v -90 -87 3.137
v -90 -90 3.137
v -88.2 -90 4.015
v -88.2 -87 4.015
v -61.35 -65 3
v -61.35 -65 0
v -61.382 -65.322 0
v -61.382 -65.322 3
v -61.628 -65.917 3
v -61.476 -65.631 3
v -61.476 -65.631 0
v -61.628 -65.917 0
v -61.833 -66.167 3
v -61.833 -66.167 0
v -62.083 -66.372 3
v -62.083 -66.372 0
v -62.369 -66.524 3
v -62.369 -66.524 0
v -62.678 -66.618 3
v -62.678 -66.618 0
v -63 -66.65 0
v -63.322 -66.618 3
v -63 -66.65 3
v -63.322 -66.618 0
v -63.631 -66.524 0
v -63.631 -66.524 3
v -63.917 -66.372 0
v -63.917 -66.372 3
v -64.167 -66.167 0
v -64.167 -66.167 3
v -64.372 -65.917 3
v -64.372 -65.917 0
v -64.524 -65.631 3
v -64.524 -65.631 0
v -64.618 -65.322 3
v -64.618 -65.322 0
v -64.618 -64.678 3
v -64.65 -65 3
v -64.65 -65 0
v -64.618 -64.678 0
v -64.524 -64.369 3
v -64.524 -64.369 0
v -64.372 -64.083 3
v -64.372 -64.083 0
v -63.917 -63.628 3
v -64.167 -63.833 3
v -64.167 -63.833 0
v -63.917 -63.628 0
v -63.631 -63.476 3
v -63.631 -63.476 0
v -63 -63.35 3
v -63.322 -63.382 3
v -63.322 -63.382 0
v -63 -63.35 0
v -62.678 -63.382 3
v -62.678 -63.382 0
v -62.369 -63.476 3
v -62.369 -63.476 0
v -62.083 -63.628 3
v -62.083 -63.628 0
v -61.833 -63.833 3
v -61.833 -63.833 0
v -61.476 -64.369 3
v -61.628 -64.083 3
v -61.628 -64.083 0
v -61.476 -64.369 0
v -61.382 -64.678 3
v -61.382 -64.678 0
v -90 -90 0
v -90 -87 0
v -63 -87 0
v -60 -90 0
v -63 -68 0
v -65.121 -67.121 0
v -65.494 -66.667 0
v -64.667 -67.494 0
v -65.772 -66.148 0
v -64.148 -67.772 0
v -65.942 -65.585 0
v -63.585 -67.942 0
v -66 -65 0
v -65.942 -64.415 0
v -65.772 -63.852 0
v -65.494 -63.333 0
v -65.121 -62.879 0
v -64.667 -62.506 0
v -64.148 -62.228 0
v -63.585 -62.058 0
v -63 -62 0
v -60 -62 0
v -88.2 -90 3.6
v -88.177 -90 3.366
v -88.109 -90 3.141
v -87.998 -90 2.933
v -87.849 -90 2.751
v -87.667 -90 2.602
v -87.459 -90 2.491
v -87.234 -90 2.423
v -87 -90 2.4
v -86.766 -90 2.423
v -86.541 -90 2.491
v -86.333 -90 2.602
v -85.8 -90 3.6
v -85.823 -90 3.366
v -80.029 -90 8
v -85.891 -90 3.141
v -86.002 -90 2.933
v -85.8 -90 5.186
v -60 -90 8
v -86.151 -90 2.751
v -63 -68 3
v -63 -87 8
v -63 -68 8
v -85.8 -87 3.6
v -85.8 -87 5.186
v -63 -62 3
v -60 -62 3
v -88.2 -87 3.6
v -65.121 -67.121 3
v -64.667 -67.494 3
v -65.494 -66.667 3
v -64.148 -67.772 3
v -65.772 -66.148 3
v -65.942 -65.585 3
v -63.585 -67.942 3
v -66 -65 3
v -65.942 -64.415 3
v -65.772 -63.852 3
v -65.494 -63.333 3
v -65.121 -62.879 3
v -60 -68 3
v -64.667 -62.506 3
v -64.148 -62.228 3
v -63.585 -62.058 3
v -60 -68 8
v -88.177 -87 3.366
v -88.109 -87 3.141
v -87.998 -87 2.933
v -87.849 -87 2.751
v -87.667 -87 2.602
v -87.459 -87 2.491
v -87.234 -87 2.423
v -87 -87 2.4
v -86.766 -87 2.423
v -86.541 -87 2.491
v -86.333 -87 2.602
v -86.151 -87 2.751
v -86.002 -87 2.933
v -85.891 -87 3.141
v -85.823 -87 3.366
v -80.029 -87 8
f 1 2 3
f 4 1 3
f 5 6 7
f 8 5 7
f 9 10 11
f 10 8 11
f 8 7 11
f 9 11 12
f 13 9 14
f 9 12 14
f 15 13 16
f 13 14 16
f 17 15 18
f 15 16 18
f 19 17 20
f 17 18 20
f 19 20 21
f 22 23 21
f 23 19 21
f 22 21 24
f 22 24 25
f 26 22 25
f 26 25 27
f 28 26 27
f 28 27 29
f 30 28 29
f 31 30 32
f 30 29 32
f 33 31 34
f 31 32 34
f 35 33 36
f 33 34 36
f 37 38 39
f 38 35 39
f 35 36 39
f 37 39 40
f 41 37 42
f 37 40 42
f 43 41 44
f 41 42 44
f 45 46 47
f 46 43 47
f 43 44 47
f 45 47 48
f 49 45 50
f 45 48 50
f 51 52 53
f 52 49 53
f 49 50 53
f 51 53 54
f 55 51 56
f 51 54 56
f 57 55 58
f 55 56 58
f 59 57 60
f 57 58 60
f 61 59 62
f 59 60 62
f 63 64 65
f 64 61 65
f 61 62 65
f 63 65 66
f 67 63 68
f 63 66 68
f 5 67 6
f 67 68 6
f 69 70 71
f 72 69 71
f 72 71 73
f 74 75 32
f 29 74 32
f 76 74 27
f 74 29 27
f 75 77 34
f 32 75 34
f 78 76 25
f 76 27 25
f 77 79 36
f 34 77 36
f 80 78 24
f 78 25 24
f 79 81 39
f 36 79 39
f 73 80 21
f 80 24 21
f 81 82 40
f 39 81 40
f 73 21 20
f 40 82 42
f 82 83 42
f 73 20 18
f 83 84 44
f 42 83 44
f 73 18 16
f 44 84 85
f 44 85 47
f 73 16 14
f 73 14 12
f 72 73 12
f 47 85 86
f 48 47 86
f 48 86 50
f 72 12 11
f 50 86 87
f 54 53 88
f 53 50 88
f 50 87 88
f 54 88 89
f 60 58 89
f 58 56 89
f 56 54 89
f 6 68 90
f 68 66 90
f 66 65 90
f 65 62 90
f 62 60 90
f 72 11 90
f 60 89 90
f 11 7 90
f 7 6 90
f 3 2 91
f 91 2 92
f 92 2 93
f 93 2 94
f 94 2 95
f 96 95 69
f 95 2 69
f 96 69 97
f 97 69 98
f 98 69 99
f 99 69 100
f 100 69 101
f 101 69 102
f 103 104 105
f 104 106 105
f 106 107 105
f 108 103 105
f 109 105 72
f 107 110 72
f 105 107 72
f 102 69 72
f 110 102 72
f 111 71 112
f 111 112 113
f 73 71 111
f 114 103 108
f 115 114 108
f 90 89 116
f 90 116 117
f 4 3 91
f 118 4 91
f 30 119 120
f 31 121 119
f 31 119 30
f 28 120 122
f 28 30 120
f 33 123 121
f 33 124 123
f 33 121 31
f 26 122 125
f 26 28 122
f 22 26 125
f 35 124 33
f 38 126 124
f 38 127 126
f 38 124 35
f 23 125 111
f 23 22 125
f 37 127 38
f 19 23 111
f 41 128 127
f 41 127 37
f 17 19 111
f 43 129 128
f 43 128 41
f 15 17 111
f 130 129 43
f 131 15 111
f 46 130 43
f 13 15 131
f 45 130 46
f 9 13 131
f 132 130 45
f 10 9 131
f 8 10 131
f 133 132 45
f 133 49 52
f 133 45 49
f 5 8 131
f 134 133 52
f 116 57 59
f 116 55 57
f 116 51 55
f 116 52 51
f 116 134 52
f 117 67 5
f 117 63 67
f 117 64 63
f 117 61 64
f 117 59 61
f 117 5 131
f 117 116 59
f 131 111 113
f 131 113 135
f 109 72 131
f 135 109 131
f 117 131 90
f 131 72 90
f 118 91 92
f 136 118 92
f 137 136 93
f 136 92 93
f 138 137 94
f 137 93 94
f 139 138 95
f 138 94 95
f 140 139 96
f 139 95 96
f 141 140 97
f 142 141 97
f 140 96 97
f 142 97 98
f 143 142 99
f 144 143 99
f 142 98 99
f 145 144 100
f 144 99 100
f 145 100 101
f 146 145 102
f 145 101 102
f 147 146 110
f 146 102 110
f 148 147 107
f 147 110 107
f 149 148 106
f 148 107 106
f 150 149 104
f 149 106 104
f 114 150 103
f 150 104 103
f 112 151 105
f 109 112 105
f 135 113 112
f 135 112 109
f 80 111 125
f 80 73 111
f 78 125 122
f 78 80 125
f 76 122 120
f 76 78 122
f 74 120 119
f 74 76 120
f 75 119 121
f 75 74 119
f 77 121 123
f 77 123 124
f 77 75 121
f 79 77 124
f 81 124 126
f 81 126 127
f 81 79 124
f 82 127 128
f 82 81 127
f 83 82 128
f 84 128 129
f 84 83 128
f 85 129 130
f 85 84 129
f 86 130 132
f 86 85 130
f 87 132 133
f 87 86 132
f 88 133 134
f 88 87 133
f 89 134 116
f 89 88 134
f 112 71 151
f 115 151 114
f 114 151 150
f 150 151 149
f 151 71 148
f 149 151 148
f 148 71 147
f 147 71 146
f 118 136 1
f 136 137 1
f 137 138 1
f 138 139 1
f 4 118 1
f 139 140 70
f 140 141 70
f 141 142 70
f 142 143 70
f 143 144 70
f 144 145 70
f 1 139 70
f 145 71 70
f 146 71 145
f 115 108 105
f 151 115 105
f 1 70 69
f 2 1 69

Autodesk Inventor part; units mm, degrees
ref_plane "YZ Plane" through (0, 0, 0) normal (1, 0, 0) x (0, 1, 0)
ref_plane "XZ Plane" through (0, 0, 0) normal (0, 1, 0) x (-1, 0, 0)
ref_plane "XY Plane" through (0, 0, 0) normal (0, 0, 1) x (1, 0, 0)
sketch "Sketch1" plane through (0, 0, 0) normal (0, 0, 1) x (1, 0, 0)
  line L0 (-58, -60) -> (-60, -60) projected
  line L1 (-60, -60) -> (-60, -39.5) projected
  line L2 (-60, -39.5) -> (-58, -39.5) projected
  line L3 (-58, -39.5) -> (-58, -60) projected
  line L4 (49.6, 30) -> (51.6, 30) projected
  line L5 (51.6, 30) -> (51.6, 9.5) projected
  line L6 (51.6, 9.5) -> (49.6, 9.5) projected
  line L7 (49.6, 9.5) -> (49.6, 30) projected
  line L8 (-58, 39.5) -> (-60, 39.5) projected
  line L9 (-60, 39.5) -> (-60, 60) projected
  line L10 (-60, 60) -> (-58, 60) projected
  line L11 (-58, 60) -> (-58, 39.5) projected
  line L12 (-21.6, -39.5) -> (-19.6, -39.5) projected
  line L13 (-19.6, -39.5) -> (-19.6, -60) projected
  line L14 (-19.6, -60) -> (-21.6, -60) projected
  line L15 (-21.6, -60) -> (-21.6, -39.5) projected
  line L16 (51.6, -30) -> (49.6, -30) projected
  line L17 (49.6, -30) -> (49.6, -9.5) projected
  line L18 (49.6, -9.5) -> (51.6, -9.5) projected
  line L19 (51.6, -9.5) -> (51.6, -30) projected
  line L20 (-21.6, 60) -> (-19.6, 60) projected
  line L21 (-19.6, 60) -> (-19.6, 39.5) projected
  line L22 (-19.6, 39.5) -> (-21.6, 39.5) projected
  line L23 (-21.6, 39.5) -> (-21.6, 60) projected
  line L24 (90, -35) -> (90, 35) projected
  line L25 (90, 35) -> (49.6, 35) projected
  line L26 (49.6, 35) -> (49.6, 60) projected
  line L27 (49.6, 60) -> (90, 60) projected
  line L28 (90, 60) -> (90, 90) projected
  line L29 (90, 90) -> (-19.6, 90) projected
  line L30 (-19.6, 90) -> (-19.6, 65) projected
  line L31 (-19.6, 65) -> (-60, 65) projected
  line L32 (-60, 65) -> (-60, 90) projected
  line L33 (-60, 90) -> (-90, 90) projected
  line L34 (-90, 90) -> (-90, -90) projected
  line L35 (-90, -90) -> (-60, -90) projected
  line L36 (-60, -90) -> (-60, -65) projected
  line L37 (-60, -65) -> (-19.6, -65) projected
  line L38 (-19.6, -65) -> (-19.6, -90) projected
  line L39 (-19.6, -90) -> (90, -90) projected
  line L40 (90, -90) -> (90, -60) projected
  line L41 (90, -60) -> (49.6, -60) projected
  line L42 (49.6, -60) -> (49.6, -35) projected
  line L43 (49.6, -35) -> (90, -35) projected
  line L44 (86, -32) -> (73.8, -32) projected
  line L45 (73.8, -32) -> (73.8, -7.5) projected
  line L46 (73.8, -7.5) -> (86, -7.5) projected
  line L47 (86, -7.5) -> (86, -32) projected
  line L48 (65.8, -32) -> (53.6, -32) projected
  line L49 (53.6, -32) -> (53.6, -7.5) projected
  line L50 (53.6, -7.5) -> (65.8, -7.5) projected
  line L51 (65.8, -7.5) -> (65.8, -32) projected
  line L52 (86, -86) -> (70.6, -86) projected
  line L53 (70.6, -86) -> (70.6, -69.8) projected
  line L54 (70.6, -69.8) -> (86, -69.8) projected
  line L55 (86, -69.8) -> (86, -86) projected
  line L56 (86, 86) -> (86, 69.8) projected
  line L57 (86, 69.8) -> (70.6, 69.8) projected
  line L58 (70.6, 69.8) -> (70.6, 86) projected
  line L59 (70.6, 86) -> (86, 86) projected
  line L60 (73.8, 32) -> (86, 32) projected
  line L61 (86, 32) -> (86, 7.5) projected
  line L62 (86, 7.5) -> (73.8, 7.5) projected
  line L63 (73.8, 7.5) -> (73.8, 32) projected
  line L64 (65.8, 32) -> (65.8, 7.5) projected
  line L65 (65.8, 7.5) -> (53.6, 7.5) projected
  line L66 (53.6, 7.5) -> (53.6, 32) projected
  line L67 (53.6, 32) -> (65.8, 32) projected
  line L68 (-69.6, -87) -> (-85, -87) projected
  line L69 (-85, -87) -> (-85, -70.8) projected
  line L70 (-85, -70.8) -> (-69.6, -70.8) projected
  line L71 (-69.6, -70.8) -> (-69.6, -87) projected
  line L72 (-56, -62) -> (-56, -37.5) projected
  line L73 (-56, -37.5) -> (-43.8, -37.5) projected
  line L74 (-43.8, -37.5) -> (-43.8, -62) projected
  line L75 (-43.8, -62) -> (-56, -62) projected
  line L76 (-56, 62) -> (-43.8, 62) projected
  line L77 (-43.8, 62) -> (-43.8, 37.5) projected
  line L78 (-43.8, 37.5) -> (-56, 37.5) projected
  line L79 (-56, 37.5) -> (-56, 62) projected
  line L80 (-23.6, 62) -> (-23.6, 37.5) projected
  line L81 (-23.6, 37.5) -> (-35.8, 37.5) projected
  line L82 (-35.8, 37.5) -> (-35.8, 62) projected
  line L83 (-35.8, 62) -> (-23.6, 62) projected
  line L84 (-23.6, -62) -> (-35.8, -62) projected
  line L85 (-35.8, -62) -> (-35.8, -37.5) projected
  line L86 (-35.8, -37.5) -> (-23.6, -37.5) projected
  line L87 (-23.6, -37.5) -> (-23.6, -62) projected
  line L88 (-85, 87) -> (-69.6, 87) projected
  line L89 (-69.6, 87) -> (-69.6, 70.8) projected
  line L90 (-69.6, 70.8) -> (-85, 70.8) projected
  line L91 (-85, 70.8) -> (-85, 87) projected
  line L92 (-63, -68) -> (-60, -68) projected
  line L93 (-60, -68) -> (-60, -65) projected
  line L94 (-60, -65) -> (-19.6, -65) projected
  line L95 (-90, -90) -> (-60, -90)
  line L96 (-60, -90) -> (-60, -87)
  line L97 (-60, -87) -> (-90, -87)
  line L98 (-90, -87) -> (-90, -90)
  line L99 (-60, -87) -> (-63, -87)
  line L100 (-63, -87) -> (-63, -68)
  line L101 (-63, -68) -> (-60, -68)
  line L102 (-60, -68) -> (-60, -87)
  line L103 (-60, -68) -> (-66, -68)
  line L104 (-66, -68) -> (-66, -62)
  line L105 (-66, -62) -> (-60, -62)
  line L106 (-60, -62) -> (-60, -68)
  circle A0 centre (-63, -65) radius 1.5 projected
  circle A1 centre (-16.6, -87) radius 1.5 projected
  circle A2 centre (49.6, -87) radius 1.5 projected
  circle A3 centre (46.6, -60) radius 1.5 projected
  circle A4 centre (87, -63) radius 1.5 projected
  circle A5 centre (46.6, -32) radius 1.5 projected
  circle A6 centre (46.6, 32) radius 1.5 projected
  circle A7 centre (87, 63) radius 1.5 projected
  circle A8 centre (46.6, 60) radius 1.5 projected
  circle A9 centre (49.6, 87) radius 1.5 projected
  circle A10 centre (-16.6, 87) radius 1.5 projected
  circle A11 centre (-16.6, 65) radius 1.5 projected
  circle A12 centre (-63, 65) radius 1.5 projected
  arc A13 (-63, -62) -> (-63, -68) centre (-63, -65) ccw projected
  arc A14 (-16.6, -68) -> (-16.6, -62) centre (-16.6, -65) ccw projected
  line L107 (-16.6, -62) -> (-63, -62) projected
  line L108 (-76, -39.25) -> (-82, -39.25) projected
  line L109 (-82, -39.25) -> (-82, -20.75) projected
  line L110 (-82, -20.75) -> (-76, -20.75) projected
  line L111 (-76, -20.75) -> (-76, -39.25) projected
  line L112 (-76, 20.75) -> (-82, 20.75) projected
  line L113 (-82, 20.75) -> (-82, 39.25) projected
  line L114 (-82, 39.25) -> (-76, 39.25) projected
  line L115 (-76, 39.25) -> (-76, 20.75) projected
  line L116 (-19.6, -68) -> (-16.6, -68) projected
  circle A15 centre (-86.5, -55.7158) radius 1.25 projected
  circle A16 centre (-86.5, 55.8) radius 1.25 projected
  circle A17 centre (-79.5, -5.4579) radius 1.25 projected
  circle A18 centre (-79.5, 5.5421) radius 1.25 projected
  line L117 (-19.6, -65) -> (-19.6, -68) projected
  point P0 (0, 0)
  dimension "d0" = 3
extrude "Extrusion1" add sketch "Sketch1" along normal blind 8 contours L36 L97 L100 L92 | L36 L35 L34 L97 L68
ref_plane "Work Plane1" through (0, 0, 0) normal (0, 0, 1) x (1, 0, 0)
sketch "Sketch2" plane through (0, 0, 0) normal (0, 0, 1) x (1, 0, 0)
  line L0 (-63, -68) -> (-60, -68) projected
  line L1 (-60, -68) -> (-60, -65) projected
  line L2 (-60, -65) -> (-19.6, -65) projected
  circle A0 centre (-63, -65) radius 2 projected
  line L3 (-60, -90) -> (-60, -68) projected
  line L4 (-60, -68) -> (-66, -68)
  line L5 (-66, -68) -> (-66, -62)
  line L6 (-66, -62) -> (-60, -62)
  line L7 (-60, -62) -> (-60, -68)
  circle A1 centre (-63, -65) radius 1.65
  arc A2 (-63, -62) -> (-63, -68) centre (-63, -65) ccw projected
  arc A3 (-16.6, -68) -> (-16.6, -62) centre (-16.6, -65) ccw projected
  line L8 (-16.6, -62) -> (-63, -62) projected
  line L9 (-19.6, -68) -> (-16.6, -68) projected
  line L10 (-19.6, -65) -> (-19.6, -68) projected
  point P0 (0, 0)
  dimension "d3" = 3.3
extrude "Extrusion2" add sketch "Sketch2" along normal blind 3 contours A2 L6 L7 L1 L0 | A0
sketch "Sketch3" plane through (-90, -90, 0) normal (0, -1, 0) x (1, 0, 0)
  line L0 (0, 0) -> (0, 8) projected
  line L1 (0, 3.137) -> (9.9706, 8)
  line L2 (0, 3.137) -> (11.0933, 3.137) construction
  line L3 (0, 8) -> (30, 8) projected
  point P0 (90, 0)
  dimension "d7" = 26
  dimension "d8" = 3.137
extrude "Extrusion3" cut sketch "Sketch3" against normal blind 3
sketch "Sketch4" plane through (-90, -90, 0) normal (0, -1, 0) x (1, 0, 0)
  circle A0 centre (3, 3.6) radius 1.2 projected
  line L0 (1.8, 2.4) -> (4.2, 2.4)
  line L1 (4.2, 2.4) -> (4.2, 4.8)
  line L2 (4.2, 4.8) -> (1.8, 4.8)
  line L3 (1.8, 4.8) -> (1.8, 2.4)
  line L4 (1.8, 2.4) -> (4.2, 4.8) construction
  line L5 (4.2, 2.4) -> (1.8, 4.8) construction
  line L6 (4.2, 4.8) -> (4.2, 5.1855)
  line L7 (0, 3.137) -> (9.9706, 8) projected
  line L8 (4.2, 5.1855) -> (3, 4.6002)
  point P0 (90, 0)
  point P1 (1.8, 4.0149)
  point P2 (1.8, 3.6)
  point P3 (4.2, 3.6)
extrude "Extrusion4" cut sketch "Sketch4" against normal blind 3 contours A0 L7 | A0 L7 L2 L1 | L2 L7 L6 | L3 L7 A0 picked at (3.089, 3.1434)
properties part number "rightfrontwall"
